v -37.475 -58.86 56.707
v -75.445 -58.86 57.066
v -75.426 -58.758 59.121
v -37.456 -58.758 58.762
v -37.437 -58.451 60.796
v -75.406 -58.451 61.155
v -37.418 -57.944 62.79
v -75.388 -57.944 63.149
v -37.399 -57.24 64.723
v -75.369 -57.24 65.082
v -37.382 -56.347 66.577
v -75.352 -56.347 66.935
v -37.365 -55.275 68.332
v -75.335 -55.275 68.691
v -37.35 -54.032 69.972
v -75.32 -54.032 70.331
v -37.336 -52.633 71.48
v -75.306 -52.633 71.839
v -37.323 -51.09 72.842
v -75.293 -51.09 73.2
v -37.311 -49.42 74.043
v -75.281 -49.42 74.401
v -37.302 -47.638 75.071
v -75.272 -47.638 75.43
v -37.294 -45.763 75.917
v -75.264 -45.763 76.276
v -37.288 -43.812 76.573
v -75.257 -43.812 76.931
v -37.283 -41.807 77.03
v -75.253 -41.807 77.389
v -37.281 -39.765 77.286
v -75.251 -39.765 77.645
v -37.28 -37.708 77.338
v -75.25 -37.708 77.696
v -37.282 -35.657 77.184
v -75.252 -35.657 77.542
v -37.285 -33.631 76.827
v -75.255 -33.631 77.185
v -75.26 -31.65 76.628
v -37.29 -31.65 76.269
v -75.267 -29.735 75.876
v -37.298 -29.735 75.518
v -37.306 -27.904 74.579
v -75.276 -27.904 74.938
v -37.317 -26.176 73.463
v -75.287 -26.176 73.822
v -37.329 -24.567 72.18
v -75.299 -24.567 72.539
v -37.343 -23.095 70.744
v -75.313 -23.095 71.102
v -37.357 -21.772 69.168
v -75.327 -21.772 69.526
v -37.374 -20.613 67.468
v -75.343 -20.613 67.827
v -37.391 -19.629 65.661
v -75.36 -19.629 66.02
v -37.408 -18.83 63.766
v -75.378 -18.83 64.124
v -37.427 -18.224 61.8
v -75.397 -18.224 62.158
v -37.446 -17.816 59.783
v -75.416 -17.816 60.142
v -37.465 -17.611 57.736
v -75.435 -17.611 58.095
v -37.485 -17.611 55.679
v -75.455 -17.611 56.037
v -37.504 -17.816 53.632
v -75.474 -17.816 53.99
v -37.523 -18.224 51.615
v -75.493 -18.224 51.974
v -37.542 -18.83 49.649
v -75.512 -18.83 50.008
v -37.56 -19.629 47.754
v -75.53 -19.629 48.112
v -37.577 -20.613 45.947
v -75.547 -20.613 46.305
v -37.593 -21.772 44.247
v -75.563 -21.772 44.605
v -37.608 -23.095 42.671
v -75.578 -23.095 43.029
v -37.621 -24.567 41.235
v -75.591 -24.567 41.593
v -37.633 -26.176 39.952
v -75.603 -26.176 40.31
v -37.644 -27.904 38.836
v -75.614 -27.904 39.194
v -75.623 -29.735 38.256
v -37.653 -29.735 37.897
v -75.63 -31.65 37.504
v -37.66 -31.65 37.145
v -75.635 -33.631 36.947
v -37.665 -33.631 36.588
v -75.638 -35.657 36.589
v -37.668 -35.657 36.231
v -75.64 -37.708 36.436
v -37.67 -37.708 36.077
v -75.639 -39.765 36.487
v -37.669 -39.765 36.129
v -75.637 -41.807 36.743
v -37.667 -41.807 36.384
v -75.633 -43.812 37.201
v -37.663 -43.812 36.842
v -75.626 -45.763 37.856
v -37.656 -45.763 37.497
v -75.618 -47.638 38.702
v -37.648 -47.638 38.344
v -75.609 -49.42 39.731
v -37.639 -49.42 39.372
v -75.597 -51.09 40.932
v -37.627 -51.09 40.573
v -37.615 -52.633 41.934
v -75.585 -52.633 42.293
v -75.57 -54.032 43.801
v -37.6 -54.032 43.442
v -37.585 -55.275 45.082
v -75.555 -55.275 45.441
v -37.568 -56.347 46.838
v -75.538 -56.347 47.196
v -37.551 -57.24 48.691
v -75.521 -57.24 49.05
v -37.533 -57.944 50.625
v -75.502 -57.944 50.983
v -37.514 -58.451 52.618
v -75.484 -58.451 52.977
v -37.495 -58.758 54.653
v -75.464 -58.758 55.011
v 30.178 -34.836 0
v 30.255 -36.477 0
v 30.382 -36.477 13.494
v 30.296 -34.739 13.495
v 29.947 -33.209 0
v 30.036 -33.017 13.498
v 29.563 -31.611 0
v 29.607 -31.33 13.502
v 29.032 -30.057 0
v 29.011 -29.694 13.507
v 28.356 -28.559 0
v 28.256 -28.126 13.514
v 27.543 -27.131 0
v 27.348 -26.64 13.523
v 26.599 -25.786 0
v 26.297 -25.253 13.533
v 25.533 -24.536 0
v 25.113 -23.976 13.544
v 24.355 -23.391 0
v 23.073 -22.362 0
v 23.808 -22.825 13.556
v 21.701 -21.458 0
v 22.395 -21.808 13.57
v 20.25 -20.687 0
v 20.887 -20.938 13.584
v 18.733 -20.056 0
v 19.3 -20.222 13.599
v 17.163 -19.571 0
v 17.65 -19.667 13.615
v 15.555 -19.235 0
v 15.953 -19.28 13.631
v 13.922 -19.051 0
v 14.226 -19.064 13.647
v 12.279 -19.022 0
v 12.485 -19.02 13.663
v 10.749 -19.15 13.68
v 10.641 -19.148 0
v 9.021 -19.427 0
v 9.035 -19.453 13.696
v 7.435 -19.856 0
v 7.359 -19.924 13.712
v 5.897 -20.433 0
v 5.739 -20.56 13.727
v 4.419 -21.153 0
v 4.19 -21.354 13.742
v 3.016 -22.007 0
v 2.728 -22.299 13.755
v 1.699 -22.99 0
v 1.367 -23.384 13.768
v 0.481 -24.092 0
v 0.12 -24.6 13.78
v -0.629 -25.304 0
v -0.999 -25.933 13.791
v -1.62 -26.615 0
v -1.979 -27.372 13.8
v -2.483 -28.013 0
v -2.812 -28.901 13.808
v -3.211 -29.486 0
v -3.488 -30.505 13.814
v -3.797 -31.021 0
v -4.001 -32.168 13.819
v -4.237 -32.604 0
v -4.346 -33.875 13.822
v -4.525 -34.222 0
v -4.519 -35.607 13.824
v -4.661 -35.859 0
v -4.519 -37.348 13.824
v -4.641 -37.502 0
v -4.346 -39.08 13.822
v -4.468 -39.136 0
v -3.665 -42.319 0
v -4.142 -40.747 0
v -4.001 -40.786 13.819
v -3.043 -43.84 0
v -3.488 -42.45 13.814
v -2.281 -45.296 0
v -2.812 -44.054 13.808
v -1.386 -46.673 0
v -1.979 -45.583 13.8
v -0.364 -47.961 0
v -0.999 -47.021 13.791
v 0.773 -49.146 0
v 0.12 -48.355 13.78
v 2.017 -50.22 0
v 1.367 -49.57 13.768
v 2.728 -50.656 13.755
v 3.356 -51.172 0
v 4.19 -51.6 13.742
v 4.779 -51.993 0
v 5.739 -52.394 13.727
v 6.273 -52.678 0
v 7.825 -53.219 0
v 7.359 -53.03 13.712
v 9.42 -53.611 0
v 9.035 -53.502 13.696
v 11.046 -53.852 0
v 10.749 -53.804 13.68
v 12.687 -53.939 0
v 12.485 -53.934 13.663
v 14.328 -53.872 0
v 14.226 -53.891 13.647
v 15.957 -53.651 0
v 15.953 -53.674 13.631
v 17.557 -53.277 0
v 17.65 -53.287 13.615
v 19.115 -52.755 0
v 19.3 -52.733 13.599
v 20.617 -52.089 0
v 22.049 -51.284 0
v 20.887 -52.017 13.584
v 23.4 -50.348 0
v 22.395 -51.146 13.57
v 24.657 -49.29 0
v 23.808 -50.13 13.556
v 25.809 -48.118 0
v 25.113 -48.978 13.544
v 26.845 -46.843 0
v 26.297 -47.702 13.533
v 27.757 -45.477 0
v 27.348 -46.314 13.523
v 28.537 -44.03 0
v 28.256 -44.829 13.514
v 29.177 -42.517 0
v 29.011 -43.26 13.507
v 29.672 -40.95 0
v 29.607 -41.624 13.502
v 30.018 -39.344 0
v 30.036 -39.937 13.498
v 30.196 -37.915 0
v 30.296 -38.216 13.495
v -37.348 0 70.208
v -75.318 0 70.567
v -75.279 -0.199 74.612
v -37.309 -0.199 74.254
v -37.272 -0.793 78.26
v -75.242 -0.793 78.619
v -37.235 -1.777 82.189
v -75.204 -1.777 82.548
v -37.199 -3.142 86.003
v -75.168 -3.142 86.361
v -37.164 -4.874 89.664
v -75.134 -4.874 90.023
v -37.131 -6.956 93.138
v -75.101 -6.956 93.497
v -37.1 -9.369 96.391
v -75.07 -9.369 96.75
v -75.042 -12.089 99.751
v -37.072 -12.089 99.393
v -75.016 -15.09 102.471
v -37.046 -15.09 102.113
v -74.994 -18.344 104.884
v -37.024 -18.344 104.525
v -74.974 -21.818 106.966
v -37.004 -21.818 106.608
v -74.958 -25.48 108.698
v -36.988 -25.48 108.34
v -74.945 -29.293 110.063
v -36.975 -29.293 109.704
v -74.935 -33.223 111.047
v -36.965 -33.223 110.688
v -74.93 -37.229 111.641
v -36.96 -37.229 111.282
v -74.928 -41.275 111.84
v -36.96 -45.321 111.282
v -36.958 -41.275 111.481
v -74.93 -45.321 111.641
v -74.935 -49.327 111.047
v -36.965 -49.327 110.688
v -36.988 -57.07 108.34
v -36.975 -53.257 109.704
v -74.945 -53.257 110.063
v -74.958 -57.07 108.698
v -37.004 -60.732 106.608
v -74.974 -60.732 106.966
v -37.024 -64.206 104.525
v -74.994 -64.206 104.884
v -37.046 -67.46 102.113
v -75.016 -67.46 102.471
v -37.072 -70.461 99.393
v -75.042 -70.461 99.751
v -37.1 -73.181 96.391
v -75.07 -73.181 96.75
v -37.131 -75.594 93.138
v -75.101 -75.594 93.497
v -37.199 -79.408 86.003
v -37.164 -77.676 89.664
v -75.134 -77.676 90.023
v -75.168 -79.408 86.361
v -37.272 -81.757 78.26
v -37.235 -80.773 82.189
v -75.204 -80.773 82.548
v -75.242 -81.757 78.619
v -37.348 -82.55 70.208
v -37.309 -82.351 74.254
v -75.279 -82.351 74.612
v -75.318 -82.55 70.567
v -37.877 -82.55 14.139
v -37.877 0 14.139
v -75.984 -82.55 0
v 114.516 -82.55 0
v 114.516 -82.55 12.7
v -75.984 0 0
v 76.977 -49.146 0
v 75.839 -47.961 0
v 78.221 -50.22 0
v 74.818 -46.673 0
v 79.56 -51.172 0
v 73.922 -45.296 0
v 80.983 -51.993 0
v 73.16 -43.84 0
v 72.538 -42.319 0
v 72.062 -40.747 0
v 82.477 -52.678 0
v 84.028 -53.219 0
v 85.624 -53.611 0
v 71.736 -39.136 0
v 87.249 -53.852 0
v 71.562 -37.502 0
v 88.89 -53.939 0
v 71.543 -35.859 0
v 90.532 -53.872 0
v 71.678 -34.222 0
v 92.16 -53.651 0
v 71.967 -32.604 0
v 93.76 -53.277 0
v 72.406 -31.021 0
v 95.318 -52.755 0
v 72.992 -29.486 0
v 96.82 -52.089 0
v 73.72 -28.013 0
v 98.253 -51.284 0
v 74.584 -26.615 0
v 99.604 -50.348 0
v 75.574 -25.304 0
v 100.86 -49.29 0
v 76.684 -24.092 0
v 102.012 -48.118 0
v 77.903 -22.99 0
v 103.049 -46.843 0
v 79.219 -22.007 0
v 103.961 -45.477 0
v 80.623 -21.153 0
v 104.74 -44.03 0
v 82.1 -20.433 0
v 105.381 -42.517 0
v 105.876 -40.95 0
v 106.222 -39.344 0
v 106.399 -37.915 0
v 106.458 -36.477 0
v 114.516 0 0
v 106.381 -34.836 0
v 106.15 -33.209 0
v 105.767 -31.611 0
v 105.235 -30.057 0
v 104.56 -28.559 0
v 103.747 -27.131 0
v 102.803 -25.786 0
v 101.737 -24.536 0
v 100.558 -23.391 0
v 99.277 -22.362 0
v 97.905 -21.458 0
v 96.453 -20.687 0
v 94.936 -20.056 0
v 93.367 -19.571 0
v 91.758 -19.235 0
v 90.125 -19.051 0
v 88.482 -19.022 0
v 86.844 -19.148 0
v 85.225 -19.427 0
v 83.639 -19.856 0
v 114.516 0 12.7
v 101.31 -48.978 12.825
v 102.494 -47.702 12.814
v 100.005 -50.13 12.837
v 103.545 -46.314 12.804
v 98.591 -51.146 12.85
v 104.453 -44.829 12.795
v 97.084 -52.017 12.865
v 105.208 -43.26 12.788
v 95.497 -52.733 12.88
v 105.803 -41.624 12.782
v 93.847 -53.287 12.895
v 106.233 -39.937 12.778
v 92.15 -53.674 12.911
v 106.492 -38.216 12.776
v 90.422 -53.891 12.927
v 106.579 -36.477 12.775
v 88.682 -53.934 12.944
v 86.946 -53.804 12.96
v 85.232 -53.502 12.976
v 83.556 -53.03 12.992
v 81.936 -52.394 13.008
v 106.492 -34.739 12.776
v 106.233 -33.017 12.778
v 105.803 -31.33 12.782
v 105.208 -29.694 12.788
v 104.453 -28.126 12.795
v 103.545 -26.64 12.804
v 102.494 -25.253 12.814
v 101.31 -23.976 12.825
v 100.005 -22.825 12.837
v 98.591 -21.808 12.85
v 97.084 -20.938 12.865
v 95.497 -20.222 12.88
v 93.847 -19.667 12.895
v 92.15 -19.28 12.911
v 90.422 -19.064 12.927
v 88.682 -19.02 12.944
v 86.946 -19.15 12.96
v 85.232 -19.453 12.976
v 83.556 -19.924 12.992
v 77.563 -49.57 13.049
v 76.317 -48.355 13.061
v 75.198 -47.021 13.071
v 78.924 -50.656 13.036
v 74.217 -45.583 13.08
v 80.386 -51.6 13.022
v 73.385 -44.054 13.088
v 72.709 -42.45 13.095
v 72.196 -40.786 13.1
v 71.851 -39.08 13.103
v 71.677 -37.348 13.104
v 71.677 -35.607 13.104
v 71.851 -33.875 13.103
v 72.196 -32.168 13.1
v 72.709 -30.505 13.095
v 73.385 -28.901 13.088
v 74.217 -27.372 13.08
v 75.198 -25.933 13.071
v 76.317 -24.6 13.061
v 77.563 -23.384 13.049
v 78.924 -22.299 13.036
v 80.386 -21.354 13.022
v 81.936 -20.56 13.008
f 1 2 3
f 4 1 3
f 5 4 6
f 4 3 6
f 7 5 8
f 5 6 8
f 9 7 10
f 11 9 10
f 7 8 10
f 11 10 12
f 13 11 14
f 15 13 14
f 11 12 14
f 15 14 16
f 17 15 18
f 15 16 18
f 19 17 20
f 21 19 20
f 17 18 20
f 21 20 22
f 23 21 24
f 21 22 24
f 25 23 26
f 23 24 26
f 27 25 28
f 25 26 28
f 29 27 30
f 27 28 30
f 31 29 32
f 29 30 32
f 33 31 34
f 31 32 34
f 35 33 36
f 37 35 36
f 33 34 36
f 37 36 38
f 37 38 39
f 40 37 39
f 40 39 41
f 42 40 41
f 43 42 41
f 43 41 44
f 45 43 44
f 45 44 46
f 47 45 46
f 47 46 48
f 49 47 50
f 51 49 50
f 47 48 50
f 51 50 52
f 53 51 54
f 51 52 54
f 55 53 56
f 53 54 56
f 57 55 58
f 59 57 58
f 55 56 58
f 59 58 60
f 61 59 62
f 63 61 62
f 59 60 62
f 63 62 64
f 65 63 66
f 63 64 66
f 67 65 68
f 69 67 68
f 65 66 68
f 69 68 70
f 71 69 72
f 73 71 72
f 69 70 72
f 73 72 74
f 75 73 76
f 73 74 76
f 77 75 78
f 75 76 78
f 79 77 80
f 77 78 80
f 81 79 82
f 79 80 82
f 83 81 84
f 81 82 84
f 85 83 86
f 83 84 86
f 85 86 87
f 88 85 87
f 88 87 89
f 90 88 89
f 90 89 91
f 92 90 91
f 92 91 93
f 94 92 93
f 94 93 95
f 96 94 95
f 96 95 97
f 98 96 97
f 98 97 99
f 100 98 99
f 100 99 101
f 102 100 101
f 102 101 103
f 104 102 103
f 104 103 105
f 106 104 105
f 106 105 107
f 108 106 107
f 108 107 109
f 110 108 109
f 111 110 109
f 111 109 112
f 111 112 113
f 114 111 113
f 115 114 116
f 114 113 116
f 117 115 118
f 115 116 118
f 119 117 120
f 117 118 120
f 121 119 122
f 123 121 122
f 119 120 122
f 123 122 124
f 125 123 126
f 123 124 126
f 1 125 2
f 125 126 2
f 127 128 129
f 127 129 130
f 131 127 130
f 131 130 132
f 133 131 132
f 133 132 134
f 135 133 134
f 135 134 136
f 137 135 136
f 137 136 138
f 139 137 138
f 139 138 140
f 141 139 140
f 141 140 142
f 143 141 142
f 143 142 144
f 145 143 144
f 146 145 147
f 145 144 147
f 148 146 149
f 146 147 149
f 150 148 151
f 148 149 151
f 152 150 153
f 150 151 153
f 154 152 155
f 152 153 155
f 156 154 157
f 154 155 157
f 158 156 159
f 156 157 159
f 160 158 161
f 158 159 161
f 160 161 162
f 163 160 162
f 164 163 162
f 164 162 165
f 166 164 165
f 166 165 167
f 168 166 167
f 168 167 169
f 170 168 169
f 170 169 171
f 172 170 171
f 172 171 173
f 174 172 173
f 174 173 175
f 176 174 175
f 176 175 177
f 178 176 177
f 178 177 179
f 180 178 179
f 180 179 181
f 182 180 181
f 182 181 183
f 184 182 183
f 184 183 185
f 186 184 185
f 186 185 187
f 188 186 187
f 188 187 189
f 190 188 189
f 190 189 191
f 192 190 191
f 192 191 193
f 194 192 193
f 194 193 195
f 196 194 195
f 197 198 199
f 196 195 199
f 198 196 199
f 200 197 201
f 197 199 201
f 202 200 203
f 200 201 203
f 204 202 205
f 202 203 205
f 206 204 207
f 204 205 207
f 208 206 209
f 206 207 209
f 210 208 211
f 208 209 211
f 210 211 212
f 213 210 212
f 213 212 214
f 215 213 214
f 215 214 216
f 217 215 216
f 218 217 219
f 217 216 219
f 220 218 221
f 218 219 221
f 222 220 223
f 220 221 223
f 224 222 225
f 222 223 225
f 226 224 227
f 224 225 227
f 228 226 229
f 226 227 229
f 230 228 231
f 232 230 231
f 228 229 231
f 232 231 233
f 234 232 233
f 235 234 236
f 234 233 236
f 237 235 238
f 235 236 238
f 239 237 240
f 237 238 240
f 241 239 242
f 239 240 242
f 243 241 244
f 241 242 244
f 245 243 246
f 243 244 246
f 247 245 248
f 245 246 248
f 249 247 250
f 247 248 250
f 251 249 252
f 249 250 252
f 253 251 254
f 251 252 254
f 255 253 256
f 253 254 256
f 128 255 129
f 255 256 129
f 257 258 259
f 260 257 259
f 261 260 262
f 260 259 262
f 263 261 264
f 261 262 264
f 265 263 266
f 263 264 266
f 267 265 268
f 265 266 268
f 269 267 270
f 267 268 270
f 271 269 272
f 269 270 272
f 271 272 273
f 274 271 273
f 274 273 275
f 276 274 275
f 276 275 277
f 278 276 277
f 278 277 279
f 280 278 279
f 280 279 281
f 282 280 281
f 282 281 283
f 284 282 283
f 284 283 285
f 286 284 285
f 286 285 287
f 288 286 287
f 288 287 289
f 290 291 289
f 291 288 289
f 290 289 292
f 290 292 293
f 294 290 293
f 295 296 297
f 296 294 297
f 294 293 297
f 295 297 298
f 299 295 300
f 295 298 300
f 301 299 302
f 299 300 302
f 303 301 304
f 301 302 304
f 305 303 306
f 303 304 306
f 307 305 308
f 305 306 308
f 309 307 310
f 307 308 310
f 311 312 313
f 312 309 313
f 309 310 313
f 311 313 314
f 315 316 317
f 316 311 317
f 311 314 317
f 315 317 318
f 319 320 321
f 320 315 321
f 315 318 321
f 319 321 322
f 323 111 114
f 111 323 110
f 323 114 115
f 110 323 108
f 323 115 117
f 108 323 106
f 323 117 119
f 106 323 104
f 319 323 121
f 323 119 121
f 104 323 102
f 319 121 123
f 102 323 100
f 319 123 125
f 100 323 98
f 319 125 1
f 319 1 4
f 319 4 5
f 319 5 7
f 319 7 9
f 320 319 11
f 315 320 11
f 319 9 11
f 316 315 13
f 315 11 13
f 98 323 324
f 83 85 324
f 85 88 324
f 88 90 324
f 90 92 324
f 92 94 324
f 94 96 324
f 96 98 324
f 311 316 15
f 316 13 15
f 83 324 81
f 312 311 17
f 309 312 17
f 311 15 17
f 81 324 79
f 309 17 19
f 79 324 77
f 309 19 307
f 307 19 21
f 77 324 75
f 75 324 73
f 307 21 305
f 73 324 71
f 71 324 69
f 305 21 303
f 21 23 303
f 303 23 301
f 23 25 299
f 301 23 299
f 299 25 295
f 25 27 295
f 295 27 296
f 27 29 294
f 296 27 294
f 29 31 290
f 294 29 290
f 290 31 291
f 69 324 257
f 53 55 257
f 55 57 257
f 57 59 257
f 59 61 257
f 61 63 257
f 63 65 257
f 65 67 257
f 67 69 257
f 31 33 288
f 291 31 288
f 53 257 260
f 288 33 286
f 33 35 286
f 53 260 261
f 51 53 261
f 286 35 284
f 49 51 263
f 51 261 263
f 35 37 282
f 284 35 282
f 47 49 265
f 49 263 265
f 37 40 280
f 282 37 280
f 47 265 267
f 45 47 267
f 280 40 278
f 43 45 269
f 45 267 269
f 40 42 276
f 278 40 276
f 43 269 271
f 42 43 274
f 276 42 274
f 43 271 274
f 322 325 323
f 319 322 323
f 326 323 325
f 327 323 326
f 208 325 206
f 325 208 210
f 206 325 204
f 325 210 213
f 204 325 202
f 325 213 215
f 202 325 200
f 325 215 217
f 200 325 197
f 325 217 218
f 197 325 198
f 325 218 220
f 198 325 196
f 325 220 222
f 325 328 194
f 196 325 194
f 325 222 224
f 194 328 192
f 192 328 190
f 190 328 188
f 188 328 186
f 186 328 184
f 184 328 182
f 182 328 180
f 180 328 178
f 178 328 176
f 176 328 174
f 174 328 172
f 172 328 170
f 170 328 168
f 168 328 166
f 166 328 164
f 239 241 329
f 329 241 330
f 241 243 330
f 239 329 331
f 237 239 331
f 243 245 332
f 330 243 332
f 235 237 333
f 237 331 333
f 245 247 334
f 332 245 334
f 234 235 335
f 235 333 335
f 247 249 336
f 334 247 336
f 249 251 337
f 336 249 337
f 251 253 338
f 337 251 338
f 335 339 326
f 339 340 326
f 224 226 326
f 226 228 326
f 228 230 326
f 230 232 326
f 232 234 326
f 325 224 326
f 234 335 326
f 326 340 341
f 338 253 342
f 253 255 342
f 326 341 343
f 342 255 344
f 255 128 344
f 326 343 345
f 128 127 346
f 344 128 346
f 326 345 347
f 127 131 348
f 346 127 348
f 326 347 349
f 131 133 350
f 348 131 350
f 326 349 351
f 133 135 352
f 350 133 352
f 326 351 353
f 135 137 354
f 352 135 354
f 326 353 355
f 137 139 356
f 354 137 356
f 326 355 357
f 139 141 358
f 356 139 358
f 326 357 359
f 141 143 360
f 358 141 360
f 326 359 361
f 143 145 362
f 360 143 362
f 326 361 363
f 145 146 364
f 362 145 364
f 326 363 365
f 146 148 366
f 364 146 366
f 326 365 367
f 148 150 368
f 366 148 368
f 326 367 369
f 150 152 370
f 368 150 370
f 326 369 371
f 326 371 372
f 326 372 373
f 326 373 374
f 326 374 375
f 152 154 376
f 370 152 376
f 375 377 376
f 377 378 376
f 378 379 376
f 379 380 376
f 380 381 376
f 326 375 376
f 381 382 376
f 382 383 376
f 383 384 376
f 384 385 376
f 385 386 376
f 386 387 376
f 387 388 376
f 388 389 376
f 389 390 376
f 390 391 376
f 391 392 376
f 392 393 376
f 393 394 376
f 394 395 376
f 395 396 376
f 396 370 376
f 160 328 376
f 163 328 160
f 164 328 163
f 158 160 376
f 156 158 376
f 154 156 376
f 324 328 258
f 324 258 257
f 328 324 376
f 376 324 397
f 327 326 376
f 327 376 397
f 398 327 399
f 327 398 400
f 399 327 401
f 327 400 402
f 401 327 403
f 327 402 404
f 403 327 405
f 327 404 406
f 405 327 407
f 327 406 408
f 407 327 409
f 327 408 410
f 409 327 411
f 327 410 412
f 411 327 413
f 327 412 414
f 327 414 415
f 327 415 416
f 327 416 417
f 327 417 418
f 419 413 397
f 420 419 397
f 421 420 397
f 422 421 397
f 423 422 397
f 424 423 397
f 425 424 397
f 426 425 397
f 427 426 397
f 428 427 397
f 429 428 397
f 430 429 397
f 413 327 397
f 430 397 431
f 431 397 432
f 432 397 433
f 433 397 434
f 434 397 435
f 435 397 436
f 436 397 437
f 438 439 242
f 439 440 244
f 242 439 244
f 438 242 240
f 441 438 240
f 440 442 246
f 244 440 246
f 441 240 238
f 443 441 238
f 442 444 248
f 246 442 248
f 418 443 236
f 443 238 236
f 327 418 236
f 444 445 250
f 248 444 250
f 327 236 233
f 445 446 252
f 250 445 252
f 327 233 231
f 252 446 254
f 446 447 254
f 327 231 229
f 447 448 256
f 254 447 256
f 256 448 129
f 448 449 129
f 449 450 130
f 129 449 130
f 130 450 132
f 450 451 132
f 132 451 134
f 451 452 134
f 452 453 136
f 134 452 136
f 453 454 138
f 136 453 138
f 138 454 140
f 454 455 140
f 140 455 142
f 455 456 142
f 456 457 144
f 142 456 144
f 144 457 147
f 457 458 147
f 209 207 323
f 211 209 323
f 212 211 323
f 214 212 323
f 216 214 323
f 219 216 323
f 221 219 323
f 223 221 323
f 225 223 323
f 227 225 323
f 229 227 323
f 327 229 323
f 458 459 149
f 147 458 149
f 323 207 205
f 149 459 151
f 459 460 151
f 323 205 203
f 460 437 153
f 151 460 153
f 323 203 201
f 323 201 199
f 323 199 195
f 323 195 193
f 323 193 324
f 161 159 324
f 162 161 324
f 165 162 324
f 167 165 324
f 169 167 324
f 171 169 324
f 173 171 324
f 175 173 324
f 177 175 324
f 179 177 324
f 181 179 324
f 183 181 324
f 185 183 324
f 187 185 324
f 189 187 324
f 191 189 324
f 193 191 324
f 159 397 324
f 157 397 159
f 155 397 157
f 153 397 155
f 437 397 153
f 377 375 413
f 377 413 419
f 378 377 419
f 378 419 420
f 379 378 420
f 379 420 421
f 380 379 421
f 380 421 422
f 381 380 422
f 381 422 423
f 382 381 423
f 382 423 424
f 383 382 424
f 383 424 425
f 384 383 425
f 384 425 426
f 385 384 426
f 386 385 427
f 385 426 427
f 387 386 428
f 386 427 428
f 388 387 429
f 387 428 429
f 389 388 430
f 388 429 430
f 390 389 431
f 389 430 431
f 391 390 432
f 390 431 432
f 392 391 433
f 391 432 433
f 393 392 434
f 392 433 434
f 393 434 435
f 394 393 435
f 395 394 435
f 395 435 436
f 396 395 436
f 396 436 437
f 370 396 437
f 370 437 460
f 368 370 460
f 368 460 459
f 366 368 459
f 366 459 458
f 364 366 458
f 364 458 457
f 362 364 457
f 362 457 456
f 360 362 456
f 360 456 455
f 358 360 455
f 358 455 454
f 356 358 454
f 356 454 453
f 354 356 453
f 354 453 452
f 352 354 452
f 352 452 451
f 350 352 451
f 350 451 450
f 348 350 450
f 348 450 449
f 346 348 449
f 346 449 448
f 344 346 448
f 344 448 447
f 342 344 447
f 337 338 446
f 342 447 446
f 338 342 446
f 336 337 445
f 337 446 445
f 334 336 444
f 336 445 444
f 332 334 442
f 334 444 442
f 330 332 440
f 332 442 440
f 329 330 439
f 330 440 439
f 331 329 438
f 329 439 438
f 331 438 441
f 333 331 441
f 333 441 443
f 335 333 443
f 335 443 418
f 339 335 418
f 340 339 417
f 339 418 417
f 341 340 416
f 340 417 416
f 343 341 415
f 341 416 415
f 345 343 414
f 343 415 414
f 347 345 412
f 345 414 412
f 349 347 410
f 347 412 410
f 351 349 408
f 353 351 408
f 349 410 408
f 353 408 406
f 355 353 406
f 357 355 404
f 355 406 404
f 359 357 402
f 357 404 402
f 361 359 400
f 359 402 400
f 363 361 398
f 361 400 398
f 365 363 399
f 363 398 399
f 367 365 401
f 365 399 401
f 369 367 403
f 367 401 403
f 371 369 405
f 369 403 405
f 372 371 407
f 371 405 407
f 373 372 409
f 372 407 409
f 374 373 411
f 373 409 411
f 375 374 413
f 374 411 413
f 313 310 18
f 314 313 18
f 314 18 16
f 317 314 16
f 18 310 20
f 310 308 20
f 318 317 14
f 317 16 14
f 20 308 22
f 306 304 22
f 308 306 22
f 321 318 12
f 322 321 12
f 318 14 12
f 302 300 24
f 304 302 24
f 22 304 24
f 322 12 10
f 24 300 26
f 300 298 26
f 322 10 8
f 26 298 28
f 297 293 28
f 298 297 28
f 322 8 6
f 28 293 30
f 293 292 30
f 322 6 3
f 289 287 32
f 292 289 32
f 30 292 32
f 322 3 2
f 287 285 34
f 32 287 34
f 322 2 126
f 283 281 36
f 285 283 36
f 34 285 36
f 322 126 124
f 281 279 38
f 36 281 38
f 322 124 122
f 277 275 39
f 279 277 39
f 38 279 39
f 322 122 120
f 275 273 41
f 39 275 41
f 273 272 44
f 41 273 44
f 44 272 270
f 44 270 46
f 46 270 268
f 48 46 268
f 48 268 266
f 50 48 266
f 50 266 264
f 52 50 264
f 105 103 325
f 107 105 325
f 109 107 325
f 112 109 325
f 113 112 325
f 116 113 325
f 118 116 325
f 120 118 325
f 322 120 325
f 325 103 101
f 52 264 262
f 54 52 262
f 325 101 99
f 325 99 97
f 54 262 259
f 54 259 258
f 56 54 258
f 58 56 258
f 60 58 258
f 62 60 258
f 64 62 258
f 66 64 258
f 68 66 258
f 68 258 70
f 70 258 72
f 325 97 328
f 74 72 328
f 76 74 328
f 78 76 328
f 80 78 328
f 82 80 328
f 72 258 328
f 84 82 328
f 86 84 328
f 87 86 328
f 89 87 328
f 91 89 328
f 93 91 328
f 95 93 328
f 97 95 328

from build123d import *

# Parameters (mm, degrees)
F1_DEPTH = 82.55
F2_R     = 17.4625
F3_DEPTH = 25.4
F5_DEPTH = 25.4
F6_DEPTH = 37.9726117289
F7_R     = 20.6375
F8_DEPTH = 37.9716117289


with BuildPart() as f1:
    # F0 (on Front) → F1 (new body)
    with BuildSketch(Plane.XZ):
        Polygon((-74.6513270113, 141.1331224257), (-75.983799994, 0), (114.516200006, 0), (114.516200006, 12.7), (-37.8770081944, 14.1387822587), (-36.6780229788, 141.1331224257), align=None)
    extrude(amount=F1_DEPTH)

    # F2 (on face) → F3 (cut)
    with BuildSketch(Plane(origin=(0.1300999203, 0, 13.7799476787), x_dir=(0.9999554344, 0, -0.0094408285), z_dir=(0.0094408285, 0, 0.9999554344))):
        with Locations((12.7911979997, -36.4772640169)):
            Circle(F2_R)
        with Locations((88.9911979997, -36.4772640169)):
            Circle(F2_R)
    extrude(amount=-F3_DEPTH, mode=Mode.SUBTRACT)

    # F5 (cut): a face of the model
    f5_faces = [f1.faces().sort_by_distance(p)[0] for p in [
        (-55.6646749951, -41.275, 141.1331224257),
    ]]
    extrude(f5_faces, amount=-F5_DEPTH, mode=Mode.SUBTRACT)

    # F4 (on face) → F6 (cut, through all)
    with BuildSketch(Plane(origin=(-75.9770276155, 0, 0.7173180531), x_dir=(0, -1, 0), z_dir=(-0.9999554344, 0, 0.0094408285))):
        with BuildLine():
            ThreePointArc((0, 69.852356173), (41.275, 111.127356173), (82.55, 69.852356173))
            Line((82.55, 69.852356173), (82.55, 140.4220623681))
            Line((82.55, 140.4220623681), (0, 140.4220623681))
            Line((0, 140.4220623681), (0, 69.852356173))
        make_face()
    extrude(amount=-F6_DEPTH, mode=Mode.SUBTRACT)

    # F7 (on face) → F8 (cut, through all)
    with BuildSketch(Plane(origin=(-75.9770276155, 0, 0.7173180531), x_dir=(0, -1, 0), z_dir=(-0.9999554344, 0, 0.0094408285))):
        with Locations((38.2229980028, 56.3510982116)):
            Circle(F7_R)
    extrude(amount=-F8_DEPTH, mode=Mode.SUBTRACT)


solid = f1.part
